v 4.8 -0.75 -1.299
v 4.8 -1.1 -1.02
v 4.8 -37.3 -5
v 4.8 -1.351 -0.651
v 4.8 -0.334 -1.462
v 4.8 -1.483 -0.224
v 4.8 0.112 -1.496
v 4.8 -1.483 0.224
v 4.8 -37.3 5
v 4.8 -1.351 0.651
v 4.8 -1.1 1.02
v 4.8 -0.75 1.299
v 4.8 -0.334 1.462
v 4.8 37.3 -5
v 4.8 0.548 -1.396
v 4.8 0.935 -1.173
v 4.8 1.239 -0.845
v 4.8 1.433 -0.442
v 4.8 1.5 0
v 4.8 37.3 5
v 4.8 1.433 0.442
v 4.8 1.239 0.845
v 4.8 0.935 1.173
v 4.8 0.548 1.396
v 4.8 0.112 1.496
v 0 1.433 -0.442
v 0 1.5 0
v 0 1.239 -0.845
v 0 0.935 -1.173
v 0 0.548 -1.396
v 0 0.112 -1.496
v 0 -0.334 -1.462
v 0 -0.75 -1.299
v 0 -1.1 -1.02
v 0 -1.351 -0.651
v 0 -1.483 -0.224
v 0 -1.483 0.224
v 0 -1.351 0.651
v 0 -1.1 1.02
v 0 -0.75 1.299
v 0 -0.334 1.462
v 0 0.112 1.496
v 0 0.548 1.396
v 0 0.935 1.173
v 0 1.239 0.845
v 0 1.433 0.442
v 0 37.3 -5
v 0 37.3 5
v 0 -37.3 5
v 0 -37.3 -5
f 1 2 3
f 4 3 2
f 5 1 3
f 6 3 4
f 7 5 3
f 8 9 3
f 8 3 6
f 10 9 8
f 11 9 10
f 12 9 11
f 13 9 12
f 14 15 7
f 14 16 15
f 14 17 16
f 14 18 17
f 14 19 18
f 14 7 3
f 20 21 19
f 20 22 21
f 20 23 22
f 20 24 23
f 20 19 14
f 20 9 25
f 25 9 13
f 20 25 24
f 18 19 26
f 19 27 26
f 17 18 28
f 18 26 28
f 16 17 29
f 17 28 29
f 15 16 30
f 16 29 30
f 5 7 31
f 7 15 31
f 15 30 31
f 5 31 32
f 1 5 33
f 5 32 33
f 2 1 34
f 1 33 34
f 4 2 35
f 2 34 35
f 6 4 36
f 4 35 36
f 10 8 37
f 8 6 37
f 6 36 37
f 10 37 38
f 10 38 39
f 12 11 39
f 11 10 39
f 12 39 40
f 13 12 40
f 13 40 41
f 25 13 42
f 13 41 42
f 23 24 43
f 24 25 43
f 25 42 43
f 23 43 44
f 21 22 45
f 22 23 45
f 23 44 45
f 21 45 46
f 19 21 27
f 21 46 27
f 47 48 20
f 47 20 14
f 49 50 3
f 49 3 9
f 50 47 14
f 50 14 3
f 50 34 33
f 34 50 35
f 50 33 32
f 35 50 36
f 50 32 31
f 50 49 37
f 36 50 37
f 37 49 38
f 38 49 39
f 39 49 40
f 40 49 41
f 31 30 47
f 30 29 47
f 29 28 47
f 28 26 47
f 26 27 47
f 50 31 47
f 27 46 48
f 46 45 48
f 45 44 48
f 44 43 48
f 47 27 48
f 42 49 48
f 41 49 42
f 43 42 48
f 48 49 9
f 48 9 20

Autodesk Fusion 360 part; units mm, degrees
sketch "Sketch1" plane through (0, 0, 0) normal (1, 0, 0) x (0, 1, 0)
  line L0 (-37.3, 5) -> (37.3, 5)
  line L1 (37.3, 5) -> (37.3, -5)
  line L2 (37.3, -5) -> (-37.3, -5)
  line L3 (-37.3, -5) -> (-37.3, 5)
  line L4 (0, 0) -> (0, 5) construction
  line L5 (0, 0) -> (-37.3, 0) construction
  circle A0 centre (0, 0) radius 1.5
  point P0 (0, 5)
  point P1 (-37.3, 0)
  dimension "d1" = 3
  dimension "d2" = 10
  dimension "d3" = 74.6
extrude "Extrude1" add sketch "Sketch1" along normal blind 4.8
